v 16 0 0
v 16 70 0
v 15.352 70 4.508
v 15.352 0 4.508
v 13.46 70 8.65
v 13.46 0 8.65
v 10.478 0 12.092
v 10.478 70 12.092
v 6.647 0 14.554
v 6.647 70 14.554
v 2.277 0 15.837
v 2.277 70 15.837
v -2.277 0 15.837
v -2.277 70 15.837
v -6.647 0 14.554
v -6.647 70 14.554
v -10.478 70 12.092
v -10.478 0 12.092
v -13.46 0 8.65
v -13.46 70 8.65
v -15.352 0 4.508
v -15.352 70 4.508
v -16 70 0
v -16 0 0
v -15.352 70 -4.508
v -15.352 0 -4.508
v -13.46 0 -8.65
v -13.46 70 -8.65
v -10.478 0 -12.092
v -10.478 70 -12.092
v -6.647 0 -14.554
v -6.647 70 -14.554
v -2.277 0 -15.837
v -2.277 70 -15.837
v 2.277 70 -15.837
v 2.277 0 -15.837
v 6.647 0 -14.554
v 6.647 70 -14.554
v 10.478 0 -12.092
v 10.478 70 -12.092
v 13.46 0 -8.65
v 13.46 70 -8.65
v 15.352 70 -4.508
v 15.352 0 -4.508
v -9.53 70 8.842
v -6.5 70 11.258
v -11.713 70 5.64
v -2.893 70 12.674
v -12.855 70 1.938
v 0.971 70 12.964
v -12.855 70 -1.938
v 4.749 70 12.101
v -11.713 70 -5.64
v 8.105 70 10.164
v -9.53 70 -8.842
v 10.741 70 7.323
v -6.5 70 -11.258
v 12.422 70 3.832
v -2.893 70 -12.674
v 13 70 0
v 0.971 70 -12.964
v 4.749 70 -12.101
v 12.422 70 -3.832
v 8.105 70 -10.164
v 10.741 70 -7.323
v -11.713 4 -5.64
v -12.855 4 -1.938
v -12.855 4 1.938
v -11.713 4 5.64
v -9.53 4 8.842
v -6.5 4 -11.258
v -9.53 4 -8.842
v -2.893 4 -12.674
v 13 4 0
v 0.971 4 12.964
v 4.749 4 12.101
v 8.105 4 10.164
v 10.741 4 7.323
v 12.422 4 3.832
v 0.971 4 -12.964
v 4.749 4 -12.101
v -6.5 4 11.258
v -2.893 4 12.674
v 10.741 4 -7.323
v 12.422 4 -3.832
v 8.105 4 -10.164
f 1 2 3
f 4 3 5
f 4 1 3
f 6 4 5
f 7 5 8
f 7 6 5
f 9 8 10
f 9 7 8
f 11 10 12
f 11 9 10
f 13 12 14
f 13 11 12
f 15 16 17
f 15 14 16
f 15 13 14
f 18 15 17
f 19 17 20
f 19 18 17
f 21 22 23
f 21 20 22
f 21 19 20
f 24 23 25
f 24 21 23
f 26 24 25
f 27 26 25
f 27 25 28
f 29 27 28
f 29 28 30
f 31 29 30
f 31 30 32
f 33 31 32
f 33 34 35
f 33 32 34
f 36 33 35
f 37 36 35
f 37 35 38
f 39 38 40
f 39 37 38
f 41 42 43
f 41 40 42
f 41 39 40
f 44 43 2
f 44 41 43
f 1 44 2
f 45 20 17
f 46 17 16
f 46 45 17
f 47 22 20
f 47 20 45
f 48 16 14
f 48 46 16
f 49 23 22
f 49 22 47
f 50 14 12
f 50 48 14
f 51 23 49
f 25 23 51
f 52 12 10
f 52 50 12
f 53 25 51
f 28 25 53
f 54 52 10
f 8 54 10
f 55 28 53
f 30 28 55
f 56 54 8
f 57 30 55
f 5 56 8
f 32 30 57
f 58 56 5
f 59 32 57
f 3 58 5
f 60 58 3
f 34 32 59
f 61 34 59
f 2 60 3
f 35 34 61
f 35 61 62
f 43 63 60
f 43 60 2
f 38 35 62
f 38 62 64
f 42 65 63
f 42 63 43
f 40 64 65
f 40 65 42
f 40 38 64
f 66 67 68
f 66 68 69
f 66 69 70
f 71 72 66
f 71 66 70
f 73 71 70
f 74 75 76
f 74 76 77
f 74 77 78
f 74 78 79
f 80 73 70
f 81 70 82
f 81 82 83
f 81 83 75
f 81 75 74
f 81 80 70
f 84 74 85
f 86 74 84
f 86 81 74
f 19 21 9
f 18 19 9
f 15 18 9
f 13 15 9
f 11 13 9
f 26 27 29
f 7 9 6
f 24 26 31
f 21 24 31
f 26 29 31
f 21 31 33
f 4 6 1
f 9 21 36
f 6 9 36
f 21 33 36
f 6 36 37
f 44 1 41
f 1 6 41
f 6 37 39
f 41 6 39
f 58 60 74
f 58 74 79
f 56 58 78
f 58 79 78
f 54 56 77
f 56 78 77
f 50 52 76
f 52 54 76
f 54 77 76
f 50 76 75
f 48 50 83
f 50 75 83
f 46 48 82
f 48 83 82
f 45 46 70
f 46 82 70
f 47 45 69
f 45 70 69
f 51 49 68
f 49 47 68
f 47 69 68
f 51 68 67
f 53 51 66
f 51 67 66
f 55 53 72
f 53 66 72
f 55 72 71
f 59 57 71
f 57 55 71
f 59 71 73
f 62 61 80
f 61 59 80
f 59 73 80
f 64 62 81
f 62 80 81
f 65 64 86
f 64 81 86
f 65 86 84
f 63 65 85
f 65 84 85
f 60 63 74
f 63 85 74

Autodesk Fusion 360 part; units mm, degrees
sketch "Sketch1" plane through (0, 0, 0) normal (0, 1, 0) x (1, 0, 0)
  circle A0 centre (0, 0) radius 16
  circle A1 centre (0, 0) radius 13
  dimension "d1" = 32
  dimension "d7" = 3
extrude "Extrude1" add sketch "Sketch1" along normal blind 70 makes body 1
extrude "Extrude2" add sketch "Sketch1" along normal blind 4 contours A1 bodies 1
copy_body "Body->Comp1" bodies 1 removing the originals makes body 2 in component "tubeToolHolder04"
component "tubeToolHolder04" placed x (1, 0, 0) y (0, 1, 0) z (0, 0, 1) at (0, 0, 0)
